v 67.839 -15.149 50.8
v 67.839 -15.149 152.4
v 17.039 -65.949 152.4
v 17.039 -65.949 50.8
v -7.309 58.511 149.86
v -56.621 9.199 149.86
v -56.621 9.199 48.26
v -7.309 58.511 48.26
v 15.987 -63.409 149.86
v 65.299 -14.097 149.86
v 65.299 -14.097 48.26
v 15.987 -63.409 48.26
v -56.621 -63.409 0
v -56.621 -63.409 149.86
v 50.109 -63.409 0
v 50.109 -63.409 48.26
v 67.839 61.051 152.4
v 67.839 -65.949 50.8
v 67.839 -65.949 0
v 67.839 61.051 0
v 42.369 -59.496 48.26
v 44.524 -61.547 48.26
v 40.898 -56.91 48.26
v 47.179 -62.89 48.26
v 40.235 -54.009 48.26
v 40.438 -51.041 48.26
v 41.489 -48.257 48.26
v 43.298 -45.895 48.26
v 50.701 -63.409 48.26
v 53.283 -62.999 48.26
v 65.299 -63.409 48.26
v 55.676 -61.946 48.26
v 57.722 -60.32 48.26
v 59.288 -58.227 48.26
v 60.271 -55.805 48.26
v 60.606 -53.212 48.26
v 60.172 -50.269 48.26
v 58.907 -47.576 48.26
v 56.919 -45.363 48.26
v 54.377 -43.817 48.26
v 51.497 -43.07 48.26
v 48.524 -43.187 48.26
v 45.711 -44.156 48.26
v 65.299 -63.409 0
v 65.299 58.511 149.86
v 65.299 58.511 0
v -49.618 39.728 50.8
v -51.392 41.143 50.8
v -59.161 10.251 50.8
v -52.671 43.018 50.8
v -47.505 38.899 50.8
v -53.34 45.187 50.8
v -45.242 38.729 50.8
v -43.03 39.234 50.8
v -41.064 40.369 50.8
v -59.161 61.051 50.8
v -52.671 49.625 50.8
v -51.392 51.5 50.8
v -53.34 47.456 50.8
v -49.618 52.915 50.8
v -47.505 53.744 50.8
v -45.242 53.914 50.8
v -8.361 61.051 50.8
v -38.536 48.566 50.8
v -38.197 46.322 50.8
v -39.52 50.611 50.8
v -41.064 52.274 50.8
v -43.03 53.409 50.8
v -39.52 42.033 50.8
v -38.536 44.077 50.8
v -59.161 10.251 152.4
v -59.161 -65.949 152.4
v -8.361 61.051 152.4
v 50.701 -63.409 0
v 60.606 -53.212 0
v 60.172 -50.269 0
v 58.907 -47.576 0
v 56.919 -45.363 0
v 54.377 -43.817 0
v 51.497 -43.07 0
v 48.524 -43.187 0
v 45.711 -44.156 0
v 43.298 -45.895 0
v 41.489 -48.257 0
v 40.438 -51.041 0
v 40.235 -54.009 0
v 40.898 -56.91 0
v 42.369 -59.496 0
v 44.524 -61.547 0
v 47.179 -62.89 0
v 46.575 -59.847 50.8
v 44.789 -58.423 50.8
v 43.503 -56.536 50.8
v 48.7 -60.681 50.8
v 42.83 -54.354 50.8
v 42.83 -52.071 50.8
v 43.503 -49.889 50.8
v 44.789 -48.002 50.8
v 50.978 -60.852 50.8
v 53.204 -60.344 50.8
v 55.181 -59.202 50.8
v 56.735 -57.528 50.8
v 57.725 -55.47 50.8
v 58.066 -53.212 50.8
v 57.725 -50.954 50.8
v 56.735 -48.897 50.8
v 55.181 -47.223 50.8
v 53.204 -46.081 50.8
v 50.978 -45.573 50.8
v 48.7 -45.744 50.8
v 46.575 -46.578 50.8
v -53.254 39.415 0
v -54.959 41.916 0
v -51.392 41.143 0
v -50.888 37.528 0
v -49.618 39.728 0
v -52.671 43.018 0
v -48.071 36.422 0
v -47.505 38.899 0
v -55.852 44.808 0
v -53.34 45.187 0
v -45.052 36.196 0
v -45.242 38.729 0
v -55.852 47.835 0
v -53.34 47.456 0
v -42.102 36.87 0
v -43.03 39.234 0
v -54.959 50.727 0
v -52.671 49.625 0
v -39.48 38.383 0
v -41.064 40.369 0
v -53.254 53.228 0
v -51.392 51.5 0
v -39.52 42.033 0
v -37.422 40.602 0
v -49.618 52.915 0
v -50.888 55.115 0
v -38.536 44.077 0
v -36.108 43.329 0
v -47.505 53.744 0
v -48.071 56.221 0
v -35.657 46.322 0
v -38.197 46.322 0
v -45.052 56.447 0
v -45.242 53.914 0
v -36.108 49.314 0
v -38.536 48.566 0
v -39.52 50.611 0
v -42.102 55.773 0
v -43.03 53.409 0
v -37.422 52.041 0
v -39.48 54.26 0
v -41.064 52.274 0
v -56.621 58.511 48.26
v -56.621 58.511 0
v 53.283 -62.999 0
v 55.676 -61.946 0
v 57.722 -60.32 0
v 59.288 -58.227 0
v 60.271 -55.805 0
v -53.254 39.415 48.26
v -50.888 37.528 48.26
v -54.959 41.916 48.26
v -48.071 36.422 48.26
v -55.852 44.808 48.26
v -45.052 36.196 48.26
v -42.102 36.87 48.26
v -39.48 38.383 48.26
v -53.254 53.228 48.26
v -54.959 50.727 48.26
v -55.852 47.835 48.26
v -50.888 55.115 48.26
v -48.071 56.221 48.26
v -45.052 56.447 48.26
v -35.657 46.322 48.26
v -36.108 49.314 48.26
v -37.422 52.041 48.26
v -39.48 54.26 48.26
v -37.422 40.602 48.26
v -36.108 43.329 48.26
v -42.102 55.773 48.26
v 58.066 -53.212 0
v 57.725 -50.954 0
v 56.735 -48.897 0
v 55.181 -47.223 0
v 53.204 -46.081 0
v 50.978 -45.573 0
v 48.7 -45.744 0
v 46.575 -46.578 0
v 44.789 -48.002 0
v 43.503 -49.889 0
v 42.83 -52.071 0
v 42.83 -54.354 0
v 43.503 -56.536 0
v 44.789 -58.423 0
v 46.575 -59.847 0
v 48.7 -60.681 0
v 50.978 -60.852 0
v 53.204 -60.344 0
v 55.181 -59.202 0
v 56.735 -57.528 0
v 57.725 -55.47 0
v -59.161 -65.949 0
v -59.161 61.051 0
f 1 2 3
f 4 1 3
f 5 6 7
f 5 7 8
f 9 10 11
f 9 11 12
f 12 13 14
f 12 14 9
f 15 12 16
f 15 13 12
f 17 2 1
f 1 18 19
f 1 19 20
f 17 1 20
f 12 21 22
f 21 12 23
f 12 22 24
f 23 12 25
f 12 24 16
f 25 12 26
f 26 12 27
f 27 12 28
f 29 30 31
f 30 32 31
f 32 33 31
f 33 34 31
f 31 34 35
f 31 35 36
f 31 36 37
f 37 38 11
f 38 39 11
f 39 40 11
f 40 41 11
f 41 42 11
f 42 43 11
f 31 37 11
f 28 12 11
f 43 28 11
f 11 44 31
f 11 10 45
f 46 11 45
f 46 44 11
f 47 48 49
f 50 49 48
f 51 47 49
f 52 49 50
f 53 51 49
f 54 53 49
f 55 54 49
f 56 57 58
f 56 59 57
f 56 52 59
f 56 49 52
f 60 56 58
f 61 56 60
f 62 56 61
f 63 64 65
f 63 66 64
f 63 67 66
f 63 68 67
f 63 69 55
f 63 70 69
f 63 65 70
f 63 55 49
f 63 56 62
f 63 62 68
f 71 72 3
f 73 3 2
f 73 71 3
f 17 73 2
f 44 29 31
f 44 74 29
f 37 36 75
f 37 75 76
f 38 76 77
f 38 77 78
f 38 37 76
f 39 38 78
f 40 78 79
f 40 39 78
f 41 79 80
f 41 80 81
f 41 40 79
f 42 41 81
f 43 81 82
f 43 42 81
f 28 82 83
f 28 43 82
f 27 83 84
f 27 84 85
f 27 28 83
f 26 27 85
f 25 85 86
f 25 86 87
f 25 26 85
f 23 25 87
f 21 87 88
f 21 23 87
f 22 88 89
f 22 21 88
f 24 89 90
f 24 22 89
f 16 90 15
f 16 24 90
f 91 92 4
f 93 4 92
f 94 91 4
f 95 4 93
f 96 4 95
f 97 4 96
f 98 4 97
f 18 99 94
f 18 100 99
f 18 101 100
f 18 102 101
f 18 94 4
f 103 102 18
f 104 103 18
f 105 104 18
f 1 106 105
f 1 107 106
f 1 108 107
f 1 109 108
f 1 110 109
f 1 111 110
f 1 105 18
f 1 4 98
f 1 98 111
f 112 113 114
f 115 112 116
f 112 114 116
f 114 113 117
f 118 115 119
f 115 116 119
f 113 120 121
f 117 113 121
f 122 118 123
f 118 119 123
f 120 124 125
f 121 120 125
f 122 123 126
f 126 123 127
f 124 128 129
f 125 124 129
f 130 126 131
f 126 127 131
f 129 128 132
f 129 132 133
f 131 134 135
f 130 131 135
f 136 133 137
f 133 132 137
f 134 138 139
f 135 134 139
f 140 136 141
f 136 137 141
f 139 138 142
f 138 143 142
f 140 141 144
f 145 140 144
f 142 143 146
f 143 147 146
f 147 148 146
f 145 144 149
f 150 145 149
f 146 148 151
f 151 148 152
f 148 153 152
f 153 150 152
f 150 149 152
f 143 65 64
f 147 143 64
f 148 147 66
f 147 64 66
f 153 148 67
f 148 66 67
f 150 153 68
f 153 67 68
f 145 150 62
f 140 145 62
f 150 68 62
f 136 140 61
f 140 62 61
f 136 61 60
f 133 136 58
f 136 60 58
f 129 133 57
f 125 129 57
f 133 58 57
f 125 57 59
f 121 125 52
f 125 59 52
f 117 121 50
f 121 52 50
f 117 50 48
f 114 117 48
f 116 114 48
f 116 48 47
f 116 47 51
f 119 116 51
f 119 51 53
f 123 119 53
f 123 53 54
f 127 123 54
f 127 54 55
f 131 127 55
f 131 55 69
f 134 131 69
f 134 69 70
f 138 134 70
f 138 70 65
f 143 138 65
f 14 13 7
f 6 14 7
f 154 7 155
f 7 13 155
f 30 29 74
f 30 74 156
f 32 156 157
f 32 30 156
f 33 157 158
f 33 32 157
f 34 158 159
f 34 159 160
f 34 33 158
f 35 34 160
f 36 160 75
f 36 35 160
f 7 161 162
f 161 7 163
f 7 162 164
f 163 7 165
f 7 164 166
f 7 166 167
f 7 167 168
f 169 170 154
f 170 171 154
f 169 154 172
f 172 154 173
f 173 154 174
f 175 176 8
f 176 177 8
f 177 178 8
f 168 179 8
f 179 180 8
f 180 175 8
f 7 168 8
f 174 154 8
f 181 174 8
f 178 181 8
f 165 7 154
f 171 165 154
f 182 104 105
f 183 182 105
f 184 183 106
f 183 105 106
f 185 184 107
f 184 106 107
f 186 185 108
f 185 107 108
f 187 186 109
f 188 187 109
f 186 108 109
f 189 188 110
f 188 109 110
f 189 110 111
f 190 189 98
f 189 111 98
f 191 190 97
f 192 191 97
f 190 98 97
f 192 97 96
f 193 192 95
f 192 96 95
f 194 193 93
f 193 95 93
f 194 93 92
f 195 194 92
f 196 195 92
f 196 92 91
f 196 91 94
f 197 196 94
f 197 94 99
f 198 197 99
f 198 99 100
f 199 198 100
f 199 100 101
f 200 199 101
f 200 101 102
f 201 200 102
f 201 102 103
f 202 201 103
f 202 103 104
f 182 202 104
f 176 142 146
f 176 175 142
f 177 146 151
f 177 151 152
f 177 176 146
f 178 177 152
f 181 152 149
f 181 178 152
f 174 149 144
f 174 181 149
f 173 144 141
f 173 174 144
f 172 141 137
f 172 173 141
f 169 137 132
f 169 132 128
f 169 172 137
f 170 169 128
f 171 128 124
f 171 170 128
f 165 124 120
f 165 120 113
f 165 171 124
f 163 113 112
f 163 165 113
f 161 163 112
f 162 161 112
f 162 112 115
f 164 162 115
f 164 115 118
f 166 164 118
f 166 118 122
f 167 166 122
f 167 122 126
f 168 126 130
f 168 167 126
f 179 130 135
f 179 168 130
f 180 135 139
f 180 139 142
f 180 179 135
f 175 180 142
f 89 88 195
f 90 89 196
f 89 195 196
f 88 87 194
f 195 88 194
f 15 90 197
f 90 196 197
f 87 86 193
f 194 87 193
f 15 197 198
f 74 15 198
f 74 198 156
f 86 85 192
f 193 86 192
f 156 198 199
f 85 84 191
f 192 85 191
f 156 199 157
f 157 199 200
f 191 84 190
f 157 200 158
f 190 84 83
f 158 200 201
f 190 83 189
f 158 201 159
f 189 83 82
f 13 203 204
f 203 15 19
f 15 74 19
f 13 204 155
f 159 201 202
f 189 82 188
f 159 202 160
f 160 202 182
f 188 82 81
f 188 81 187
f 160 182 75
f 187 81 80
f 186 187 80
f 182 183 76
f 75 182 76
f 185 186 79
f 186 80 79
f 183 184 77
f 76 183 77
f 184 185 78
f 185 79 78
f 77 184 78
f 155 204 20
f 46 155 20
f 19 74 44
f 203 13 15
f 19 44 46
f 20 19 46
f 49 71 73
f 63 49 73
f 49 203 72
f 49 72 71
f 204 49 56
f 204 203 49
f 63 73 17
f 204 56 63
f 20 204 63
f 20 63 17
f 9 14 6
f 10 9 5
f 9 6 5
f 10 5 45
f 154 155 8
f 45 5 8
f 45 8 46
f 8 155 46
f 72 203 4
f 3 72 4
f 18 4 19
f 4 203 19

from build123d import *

# Parameters (mm, degrees)
F0_W     = 127
F0_H     = 127
F1_DEPTH = 152.4
F3_DEPTH = 101.6
F4_R     = 7.6138039838
F4_R_2   = 7.6607113174
F5_DEPTH = 203.2
F6_T     = -2.54


with BuildPart() as f1:
    # F0 (on Top) → F1 (new body)
    with BuildSketch(Plane.XY):
        with Locations((4.3386593461, -2.4487966104)):
            Rectangle(F0_W, F0_H)
    extrude(amount=F1_DEPTH)

    # F2 (on face) → F3 (cut)
    with BuildSketch(Plane.XY.offset(152.4)):
        Polygon((-8.3613406539, 61.0512033896), (-59.1613406539, 61.0512033896), (-59.1613406539, 10.2512033896), align=None)
        Polygon((67.8386593461, -15.1487966104), (17.0386593461, -65.9487966104), (67.8386593461, -65.9487966104), align=None)
    extrude(amount=-F3_DEPTH, mode=Mode.SUBTRACT)

    # F4 (on face) → F5 (cut)
    with BuildSketch(Plane.XY.offset(50.8)):
        with Locations((-45.811150223, 46.3215783238)):
            Circle(F4_R)
        with Locations((50.4050254822, -53.2123930752)):
            Circle(F4_R_2)
    extrude(amount=-F5_DEPTH, mode=Mode.SUBTRACT)

    # F6
    f6_openings = [f1.faces().sort_by_distance(p)[0] for p in [
        (4.379261, -2.418518, 0),
    ]]
    offset(amount=F6_T, openings=f6_openings, kind=Kind.INTERSECTION)


solid = f1.part
